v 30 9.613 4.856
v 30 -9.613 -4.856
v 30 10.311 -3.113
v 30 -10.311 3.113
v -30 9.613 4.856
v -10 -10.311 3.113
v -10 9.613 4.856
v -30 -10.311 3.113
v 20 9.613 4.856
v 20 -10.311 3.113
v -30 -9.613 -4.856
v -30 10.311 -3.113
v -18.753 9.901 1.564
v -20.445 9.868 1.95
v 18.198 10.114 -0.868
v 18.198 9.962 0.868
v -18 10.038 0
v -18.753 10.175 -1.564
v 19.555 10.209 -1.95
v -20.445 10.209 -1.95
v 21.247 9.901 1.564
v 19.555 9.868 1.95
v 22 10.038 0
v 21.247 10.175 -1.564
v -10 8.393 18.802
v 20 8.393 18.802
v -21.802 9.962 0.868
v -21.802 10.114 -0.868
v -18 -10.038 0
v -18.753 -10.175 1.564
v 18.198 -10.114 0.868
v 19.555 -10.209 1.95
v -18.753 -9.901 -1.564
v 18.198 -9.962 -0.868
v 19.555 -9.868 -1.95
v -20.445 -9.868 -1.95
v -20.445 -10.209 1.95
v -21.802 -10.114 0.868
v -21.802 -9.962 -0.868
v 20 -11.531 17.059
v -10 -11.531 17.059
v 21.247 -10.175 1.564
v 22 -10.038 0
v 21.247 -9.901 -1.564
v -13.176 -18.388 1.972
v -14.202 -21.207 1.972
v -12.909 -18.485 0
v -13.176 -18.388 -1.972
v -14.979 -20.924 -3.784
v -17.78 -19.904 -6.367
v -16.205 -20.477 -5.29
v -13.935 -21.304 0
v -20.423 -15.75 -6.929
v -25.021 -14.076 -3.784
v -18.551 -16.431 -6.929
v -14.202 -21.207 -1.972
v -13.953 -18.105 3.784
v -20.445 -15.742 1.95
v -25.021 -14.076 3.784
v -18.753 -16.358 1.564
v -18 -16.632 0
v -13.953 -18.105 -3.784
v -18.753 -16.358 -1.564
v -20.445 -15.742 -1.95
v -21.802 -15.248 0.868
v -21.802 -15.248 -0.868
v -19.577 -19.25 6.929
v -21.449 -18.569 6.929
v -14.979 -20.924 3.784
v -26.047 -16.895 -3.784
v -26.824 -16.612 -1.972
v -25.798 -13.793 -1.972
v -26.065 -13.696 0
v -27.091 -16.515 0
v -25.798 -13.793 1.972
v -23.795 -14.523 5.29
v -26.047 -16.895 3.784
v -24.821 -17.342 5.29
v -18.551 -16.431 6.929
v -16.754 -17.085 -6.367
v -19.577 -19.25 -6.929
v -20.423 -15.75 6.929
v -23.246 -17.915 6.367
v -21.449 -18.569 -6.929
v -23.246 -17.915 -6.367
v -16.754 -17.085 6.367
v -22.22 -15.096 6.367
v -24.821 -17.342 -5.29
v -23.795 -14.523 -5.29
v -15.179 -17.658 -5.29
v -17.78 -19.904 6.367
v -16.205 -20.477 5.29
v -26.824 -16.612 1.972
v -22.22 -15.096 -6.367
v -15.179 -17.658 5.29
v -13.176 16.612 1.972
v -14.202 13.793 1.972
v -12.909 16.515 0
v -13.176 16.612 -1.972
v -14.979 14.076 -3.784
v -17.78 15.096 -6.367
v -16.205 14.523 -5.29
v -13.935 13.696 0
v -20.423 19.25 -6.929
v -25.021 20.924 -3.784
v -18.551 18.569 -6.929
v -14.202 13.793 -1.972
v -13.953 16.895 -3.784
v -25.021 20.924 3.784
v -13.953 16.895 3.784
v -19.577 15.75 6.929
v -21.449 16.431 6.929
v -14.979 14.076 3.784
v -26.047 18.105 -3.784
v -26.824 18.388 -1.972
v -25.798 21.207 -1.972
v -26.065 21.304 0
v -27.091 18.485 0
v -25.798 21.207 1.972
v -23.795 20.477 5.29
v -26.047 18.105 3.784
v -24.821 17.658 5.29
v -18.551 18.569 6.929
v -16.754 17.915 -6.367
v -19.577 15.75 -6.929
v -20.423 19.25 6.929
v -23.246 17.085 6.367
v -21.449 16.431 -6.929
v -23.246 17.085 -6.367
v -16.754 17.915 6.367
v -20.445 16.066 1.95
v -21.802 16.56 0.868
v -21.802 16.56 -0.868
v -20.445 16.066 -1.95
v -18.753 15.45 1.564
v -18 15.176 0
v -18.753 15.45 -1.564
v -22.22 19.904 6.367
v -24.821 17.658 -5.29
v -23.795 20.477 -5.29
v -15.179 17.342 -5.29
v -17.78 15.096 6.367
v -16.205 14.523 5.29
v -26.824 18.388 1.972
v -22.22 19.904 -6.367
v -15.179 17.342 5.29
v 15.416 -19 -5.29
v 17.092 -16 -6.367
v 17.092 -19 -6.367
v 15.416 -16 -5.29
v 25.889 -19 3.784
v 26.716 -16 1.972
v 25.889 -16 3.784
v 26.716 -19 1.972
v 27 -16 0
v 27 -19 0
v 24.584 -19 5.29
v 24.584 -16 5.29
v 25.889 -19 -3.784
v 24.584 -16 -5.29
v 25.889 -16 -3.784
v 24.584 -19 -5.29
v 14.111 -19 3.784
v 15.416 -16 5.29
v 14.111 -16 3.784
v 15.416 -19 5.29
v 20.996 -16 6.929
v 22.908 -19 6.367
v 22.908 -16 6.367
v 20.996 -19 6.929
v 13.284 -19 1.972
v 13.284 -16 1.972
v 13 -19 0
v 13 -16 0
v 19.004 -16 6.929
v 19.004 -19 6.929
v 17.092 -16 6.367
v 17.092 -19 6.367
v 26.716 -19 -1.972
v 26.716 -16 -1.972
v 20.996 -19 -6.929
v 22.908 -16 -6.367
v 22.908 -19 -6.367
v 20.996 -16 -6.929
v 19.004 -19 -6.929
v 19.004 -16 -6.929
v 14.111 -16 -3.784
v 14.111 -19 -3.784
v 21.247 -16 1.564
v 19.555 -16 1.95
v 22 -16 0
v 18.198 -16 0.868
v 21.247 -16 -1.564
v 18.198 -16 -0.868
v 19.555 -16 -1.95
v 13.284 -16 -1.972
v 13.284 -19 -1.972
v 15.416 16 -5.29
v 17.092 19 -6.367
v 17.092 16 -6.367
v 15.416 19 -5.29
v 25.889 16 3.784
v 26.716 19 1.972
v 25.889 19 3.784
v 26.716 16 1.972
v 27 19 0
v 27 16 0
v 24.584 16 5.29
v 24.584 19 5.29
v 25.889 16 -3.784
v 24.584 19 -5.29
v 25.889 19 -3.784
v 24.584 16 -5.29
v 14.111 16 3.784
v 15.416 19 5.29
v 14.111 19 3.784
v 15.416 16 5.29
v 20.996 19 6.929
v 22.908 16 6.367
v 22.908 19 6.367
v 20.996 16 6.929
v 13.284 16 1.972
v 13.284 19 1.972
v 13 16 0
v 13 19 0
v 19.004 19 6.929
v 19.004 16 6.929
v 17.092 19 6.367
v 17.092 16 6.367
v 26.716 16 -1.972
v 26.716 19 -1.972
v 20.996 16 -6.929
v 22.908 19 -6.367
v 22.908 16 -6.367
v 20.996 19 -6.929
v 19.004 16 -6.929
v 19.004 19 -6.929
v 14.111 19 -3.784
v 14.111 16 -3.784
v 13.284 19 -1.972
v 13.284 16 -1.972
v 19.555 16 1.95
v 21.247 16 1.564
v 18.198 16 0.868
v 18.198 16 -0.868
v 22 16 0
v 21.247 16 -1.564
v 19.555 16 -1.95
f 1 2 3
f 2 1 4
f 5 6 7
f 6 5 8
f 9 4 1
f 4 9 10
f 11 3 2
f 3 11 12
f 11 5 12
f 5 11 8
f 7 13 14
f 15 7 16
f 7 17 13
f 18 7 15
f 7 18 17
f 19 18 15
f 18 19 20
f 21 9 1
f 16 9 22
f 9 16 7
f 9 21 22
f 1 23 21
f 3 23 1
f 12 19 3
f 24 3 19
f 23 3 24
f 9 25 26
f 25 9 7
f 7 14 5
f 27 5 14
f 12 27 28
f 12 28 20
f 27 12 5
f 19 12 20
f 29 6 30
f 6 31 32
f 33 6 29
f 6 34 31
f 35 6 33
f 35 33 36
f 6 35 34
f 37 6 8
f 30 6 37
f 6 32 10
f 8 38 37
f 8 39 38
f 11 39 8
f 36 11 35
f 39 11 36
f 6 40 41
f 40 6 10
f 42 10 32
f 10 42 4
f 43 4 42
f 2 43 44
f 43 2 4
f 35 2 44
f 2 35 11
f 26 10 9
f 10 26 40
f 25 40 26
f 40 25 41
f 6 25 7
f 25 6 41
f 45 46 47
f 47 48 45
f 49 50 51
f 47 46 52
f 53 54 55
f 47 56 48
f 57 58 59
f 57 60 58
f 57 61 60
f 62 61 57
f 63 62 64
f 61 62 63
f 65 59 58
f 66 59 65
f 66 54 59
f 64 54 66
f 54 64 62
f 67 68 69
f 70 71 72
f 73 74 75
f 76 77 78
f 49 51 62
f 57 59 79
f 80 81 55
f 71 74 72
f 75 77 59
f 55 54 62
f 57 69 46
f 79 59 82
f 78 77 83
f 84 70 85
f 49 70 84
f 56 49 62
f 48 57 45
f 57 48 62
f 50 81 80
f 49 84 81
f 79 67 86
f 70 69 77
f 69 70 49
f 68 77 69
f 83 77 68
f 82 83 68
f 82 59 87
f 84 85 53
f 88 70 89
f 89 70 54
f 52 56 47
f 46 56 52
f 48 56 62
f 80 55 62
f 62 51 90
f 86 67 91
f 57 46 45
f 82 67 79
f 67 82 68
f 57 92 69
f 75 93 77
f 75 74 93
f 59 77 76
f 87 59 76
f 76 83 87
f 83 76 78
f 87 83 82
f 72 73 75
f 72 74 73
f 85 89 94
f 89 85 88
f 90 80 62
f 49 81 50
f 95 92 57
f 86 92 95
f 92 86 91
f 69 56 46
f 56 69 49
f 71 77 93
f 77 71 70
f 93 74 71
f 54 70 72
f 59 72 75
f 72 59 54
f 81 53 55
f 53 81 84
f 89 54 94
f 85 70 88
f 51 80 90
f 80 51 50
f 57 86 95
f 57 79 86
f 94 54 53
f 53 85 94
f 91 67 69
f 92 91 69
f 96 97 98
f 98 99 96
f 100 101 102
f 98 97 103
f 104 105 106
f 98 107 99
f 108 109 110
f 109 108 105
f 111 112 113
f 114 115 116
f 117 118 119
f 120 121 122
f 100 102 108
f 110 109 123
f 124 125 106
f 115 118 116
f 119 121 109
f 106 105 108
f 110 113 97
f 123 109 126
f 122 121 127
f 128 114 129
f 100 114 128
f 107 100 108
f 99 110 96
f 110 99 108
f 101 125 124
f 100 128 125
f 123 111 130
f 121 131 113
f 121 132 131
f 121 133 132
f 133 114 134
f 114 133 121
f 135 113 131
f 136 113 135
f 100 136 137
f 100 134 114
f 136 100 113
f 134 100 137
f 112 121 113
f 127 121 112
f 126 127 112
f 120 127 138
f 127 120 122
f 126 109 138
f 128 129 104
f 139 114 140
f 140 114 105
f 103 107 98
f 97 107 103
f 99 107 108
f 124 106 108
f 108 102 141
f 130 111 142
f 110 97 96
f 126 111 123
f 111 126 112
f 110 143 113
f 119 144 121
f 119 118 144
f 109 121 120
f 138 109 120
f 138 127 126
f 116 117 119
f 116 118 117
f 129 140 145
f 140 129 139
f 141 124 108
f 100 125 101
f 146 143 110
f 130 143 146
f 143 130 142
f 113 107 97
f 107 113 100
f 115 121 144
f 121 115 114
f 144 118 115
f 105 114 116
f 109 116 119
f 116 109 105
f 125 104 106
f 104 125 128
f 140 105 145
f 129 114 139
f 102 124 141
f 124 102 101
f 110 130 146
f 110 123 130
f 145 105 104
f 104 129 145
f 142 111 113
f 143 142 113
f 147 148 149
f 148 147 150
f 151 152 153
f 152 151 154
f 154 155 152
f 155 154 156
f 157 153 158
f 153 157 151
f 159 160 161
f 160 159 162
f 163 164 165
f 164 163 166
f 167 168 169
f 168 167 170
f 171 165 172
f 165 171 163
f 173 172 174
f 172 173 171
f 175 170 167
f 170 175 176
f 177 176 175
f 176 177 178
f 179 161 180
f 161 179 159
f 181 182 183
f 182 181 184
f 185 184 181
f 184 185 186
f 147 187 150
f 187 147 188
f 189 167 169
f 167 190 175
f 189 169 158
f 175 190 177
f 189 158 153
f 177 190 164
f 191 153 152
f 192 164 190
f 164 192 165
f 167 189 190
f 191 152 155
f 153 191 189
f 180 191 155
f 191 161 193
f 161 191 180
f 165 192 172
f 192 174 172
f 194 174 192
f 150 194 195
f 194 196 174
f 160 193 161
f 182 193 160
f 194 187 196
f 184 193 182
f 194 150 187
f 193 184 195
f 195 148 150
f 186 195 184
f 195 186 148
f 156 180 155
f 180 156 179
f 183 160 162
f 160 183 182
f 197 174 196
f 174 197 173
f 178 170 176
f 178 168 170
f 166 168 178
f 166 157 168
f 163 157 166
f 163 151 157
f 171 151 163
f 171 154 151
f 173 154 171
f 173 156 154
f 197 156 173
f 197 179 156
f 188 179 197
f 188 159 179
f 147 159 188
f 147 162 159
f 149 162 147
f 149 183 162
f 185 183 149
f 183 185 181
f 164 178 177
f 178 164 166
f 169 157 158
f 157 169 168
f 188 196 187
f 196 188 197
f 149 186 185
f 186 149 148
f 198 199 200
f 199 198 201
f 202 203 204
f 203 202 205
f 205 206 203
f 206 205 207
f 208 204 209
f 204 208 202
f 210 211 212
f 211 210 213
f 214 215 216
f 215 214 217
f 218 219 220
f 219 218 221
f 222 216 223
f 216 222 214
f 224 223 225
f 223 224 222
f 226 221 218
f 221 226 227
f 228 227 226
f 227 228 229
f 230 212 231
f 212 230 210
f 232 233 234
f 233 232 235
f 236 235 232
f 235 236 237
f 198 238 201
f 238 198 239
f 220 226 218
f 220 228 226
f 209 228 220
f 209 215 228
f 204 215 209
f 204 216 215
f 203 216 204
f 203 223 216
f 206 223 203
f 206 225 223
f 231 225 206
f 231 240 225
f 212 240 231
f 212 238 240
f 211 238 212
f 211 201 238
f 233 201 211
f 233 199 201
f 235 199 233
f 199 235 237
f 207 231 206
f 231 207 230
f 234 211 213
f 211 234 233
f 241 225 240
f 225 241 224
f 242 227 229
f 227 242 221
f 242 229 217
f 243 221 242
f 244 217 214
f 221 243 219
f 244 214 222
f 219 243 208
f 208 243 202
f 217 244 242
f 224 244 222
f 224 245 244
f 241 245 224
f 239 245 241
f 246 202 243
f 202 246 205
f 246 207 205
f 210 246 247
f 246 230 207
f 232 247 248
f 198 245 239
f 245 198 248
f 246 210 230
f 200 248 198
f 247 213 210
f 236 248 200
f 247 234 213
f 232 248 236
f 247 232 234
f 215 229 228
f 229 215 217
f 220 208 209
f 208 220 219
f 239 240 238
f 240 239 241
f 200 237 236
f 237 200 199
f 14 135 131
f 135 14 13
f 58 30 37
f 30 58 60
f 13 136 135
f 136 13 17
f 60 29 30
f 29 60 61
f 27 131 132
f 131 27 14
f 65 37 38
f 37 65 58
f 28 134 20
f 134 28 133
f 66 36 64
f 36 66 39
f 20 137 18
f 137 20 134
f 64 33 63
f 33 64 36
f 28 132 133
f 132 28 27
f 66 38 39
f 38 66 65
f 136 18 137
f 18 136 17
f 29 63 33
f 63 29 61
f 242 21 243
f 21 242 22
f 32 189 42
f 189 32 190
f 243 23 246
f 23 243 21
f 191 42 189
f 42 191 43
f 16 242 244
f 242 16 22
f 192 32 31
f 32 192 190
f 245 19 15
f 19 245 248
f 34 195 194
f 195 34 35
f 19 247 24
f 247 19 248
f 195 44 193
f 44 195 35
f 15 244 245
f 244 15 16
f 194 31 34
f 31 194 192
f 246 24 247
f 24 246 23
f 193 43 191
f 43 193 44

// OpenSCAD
// Chapter Two

// https://openscad.org/documentation.html#tutorial
// https://en.wikibooks.org/wiki/OpenSCAD_Tutorial/Chapter_2

/* Quick quiz
The following script is the model
you created in the first chapter.

Exercise
========

Try rotating the front wheels
by -20 degrees around the Z axis,
as if the car was making a right turn.

In order to make your model more convincing,
try rotating the body of the car (base and top)
by 5 degrees around the X axis
in the opposite direction of the turn.

To turn the wheels,
modify the input parameters
of existing rotate commands,
to turn the body add a new rotate command.

Exercise
========
Try changing the radius of the wheels to 10 units. 

How easily did you find, 
which values to modify? 
- Parameterised !

Did you have to do the same thing four times?
- No.

Note:
If you reassign a different value to wheelRadius 
several times in the script
it is the last assignment 
that will be used all over the script !!!

Exercise
========
Try modifying 
the height of the car’s body base and top 
by defining a baseHeight and a topHeight variable 
and making the appropriate changes 
to the corresponding statements 
that define the base and the top. 

Assign the value 5 to the baseHeight variable 
and the value 8 to the topHeight variable. What do you notice?


Exercise
========
Try parameterizing the translation 
of the body’s top along the Z axis 
using the baseHeight and topHeight variables 
to make it sit on top of the body’s base. 

Try assigning different values 
to the baseBeight and topHeight variables. 

Does the position of the body’s top remain correct?
Yes, it does.

You should remember 
that every time 
you parameterize some aspect of your model 
you should also parameterize 
additional dependent aspects 
to prevent your model from breaking apart.


Exercise
========
Try to parameterise the track 
(lateral distance of the wheels) 
using a new variable named track. 

Try assigning different values to the track variable. 

What do you notice? 
Does any other aspect of your model 
depend on the value of the track variable? 

Yes, front & rear axle

If yes, 
use the track variable 
to parameterize it 
so your model doesn’t break apart.

*/


// resolution settings
// $fa = 1;
// $fs = 0.4;


/* PARAMETERS */
/* PARAMETERS */
/* PARAMETERS */
// turnFrontWheels = [0,0,0]; // degrees
turnFrontWheels = [0,0,-20]; // degrees

// turnBody = [0,0,0];
turnBody = [5,0,0];

// wheel radius
wheelRadius = 7;
// axel radius
axleRadius = 2;

// baseHeight = 10;
// topHeight = 10;
baseHeight = 8;
topHeight = 14;

track = 35; // wheel distance

// Car body base
rotate(turnBody) {
    cube([ 60, 20, baseHeight ], center = true);

    // Car body top
    translate([ 5, 0, (baseHeight+topHeight)/2 - 0.001 ]) 
        cube([ 30, 20, topHeight ], center = true);
}

// Front left wheel
translate([ -20, -track/2, 0 ]) 
rotate([ 90, 0, 0 ]+turnFrontWheels)
    cylinder(h = 3, r = wheelRadius, center = true);

// Front right wheel
translate([ -20, track/2, 0 ]) 
rotate([ 90, 0, 0 ]+turnFrontWheels)
    cylinder(h = 3, r = wheelRadius, center = true);

// wheelRadius = 10;

// Rear left wheel
translate([ 20, -track/2, 0 ]) rotate([ 90, 0, 0 ])
    cylinder(h = 3, r = wheelRadius, center = true);

// Rear right wheel
translate([ 20, track/2, 0 ]) rotate([ 90, 0, 0 ])
    cylinder(h = 3, r = wheelRadius, center = true);

// wheelRadius = 15;

// Front axle
translate([ -20, 0, 0 ]) rotate([ 90, 0, 0 ])
    cylinder(h = track, r = axleRadius, center = true);

// Rear axle
translate([ 20, 0, 0 ]) rotate([ 90, 0, 0 ])
    cylinder(h = track, r = axleRadius, center = true);

// wheelRadius = 20;
